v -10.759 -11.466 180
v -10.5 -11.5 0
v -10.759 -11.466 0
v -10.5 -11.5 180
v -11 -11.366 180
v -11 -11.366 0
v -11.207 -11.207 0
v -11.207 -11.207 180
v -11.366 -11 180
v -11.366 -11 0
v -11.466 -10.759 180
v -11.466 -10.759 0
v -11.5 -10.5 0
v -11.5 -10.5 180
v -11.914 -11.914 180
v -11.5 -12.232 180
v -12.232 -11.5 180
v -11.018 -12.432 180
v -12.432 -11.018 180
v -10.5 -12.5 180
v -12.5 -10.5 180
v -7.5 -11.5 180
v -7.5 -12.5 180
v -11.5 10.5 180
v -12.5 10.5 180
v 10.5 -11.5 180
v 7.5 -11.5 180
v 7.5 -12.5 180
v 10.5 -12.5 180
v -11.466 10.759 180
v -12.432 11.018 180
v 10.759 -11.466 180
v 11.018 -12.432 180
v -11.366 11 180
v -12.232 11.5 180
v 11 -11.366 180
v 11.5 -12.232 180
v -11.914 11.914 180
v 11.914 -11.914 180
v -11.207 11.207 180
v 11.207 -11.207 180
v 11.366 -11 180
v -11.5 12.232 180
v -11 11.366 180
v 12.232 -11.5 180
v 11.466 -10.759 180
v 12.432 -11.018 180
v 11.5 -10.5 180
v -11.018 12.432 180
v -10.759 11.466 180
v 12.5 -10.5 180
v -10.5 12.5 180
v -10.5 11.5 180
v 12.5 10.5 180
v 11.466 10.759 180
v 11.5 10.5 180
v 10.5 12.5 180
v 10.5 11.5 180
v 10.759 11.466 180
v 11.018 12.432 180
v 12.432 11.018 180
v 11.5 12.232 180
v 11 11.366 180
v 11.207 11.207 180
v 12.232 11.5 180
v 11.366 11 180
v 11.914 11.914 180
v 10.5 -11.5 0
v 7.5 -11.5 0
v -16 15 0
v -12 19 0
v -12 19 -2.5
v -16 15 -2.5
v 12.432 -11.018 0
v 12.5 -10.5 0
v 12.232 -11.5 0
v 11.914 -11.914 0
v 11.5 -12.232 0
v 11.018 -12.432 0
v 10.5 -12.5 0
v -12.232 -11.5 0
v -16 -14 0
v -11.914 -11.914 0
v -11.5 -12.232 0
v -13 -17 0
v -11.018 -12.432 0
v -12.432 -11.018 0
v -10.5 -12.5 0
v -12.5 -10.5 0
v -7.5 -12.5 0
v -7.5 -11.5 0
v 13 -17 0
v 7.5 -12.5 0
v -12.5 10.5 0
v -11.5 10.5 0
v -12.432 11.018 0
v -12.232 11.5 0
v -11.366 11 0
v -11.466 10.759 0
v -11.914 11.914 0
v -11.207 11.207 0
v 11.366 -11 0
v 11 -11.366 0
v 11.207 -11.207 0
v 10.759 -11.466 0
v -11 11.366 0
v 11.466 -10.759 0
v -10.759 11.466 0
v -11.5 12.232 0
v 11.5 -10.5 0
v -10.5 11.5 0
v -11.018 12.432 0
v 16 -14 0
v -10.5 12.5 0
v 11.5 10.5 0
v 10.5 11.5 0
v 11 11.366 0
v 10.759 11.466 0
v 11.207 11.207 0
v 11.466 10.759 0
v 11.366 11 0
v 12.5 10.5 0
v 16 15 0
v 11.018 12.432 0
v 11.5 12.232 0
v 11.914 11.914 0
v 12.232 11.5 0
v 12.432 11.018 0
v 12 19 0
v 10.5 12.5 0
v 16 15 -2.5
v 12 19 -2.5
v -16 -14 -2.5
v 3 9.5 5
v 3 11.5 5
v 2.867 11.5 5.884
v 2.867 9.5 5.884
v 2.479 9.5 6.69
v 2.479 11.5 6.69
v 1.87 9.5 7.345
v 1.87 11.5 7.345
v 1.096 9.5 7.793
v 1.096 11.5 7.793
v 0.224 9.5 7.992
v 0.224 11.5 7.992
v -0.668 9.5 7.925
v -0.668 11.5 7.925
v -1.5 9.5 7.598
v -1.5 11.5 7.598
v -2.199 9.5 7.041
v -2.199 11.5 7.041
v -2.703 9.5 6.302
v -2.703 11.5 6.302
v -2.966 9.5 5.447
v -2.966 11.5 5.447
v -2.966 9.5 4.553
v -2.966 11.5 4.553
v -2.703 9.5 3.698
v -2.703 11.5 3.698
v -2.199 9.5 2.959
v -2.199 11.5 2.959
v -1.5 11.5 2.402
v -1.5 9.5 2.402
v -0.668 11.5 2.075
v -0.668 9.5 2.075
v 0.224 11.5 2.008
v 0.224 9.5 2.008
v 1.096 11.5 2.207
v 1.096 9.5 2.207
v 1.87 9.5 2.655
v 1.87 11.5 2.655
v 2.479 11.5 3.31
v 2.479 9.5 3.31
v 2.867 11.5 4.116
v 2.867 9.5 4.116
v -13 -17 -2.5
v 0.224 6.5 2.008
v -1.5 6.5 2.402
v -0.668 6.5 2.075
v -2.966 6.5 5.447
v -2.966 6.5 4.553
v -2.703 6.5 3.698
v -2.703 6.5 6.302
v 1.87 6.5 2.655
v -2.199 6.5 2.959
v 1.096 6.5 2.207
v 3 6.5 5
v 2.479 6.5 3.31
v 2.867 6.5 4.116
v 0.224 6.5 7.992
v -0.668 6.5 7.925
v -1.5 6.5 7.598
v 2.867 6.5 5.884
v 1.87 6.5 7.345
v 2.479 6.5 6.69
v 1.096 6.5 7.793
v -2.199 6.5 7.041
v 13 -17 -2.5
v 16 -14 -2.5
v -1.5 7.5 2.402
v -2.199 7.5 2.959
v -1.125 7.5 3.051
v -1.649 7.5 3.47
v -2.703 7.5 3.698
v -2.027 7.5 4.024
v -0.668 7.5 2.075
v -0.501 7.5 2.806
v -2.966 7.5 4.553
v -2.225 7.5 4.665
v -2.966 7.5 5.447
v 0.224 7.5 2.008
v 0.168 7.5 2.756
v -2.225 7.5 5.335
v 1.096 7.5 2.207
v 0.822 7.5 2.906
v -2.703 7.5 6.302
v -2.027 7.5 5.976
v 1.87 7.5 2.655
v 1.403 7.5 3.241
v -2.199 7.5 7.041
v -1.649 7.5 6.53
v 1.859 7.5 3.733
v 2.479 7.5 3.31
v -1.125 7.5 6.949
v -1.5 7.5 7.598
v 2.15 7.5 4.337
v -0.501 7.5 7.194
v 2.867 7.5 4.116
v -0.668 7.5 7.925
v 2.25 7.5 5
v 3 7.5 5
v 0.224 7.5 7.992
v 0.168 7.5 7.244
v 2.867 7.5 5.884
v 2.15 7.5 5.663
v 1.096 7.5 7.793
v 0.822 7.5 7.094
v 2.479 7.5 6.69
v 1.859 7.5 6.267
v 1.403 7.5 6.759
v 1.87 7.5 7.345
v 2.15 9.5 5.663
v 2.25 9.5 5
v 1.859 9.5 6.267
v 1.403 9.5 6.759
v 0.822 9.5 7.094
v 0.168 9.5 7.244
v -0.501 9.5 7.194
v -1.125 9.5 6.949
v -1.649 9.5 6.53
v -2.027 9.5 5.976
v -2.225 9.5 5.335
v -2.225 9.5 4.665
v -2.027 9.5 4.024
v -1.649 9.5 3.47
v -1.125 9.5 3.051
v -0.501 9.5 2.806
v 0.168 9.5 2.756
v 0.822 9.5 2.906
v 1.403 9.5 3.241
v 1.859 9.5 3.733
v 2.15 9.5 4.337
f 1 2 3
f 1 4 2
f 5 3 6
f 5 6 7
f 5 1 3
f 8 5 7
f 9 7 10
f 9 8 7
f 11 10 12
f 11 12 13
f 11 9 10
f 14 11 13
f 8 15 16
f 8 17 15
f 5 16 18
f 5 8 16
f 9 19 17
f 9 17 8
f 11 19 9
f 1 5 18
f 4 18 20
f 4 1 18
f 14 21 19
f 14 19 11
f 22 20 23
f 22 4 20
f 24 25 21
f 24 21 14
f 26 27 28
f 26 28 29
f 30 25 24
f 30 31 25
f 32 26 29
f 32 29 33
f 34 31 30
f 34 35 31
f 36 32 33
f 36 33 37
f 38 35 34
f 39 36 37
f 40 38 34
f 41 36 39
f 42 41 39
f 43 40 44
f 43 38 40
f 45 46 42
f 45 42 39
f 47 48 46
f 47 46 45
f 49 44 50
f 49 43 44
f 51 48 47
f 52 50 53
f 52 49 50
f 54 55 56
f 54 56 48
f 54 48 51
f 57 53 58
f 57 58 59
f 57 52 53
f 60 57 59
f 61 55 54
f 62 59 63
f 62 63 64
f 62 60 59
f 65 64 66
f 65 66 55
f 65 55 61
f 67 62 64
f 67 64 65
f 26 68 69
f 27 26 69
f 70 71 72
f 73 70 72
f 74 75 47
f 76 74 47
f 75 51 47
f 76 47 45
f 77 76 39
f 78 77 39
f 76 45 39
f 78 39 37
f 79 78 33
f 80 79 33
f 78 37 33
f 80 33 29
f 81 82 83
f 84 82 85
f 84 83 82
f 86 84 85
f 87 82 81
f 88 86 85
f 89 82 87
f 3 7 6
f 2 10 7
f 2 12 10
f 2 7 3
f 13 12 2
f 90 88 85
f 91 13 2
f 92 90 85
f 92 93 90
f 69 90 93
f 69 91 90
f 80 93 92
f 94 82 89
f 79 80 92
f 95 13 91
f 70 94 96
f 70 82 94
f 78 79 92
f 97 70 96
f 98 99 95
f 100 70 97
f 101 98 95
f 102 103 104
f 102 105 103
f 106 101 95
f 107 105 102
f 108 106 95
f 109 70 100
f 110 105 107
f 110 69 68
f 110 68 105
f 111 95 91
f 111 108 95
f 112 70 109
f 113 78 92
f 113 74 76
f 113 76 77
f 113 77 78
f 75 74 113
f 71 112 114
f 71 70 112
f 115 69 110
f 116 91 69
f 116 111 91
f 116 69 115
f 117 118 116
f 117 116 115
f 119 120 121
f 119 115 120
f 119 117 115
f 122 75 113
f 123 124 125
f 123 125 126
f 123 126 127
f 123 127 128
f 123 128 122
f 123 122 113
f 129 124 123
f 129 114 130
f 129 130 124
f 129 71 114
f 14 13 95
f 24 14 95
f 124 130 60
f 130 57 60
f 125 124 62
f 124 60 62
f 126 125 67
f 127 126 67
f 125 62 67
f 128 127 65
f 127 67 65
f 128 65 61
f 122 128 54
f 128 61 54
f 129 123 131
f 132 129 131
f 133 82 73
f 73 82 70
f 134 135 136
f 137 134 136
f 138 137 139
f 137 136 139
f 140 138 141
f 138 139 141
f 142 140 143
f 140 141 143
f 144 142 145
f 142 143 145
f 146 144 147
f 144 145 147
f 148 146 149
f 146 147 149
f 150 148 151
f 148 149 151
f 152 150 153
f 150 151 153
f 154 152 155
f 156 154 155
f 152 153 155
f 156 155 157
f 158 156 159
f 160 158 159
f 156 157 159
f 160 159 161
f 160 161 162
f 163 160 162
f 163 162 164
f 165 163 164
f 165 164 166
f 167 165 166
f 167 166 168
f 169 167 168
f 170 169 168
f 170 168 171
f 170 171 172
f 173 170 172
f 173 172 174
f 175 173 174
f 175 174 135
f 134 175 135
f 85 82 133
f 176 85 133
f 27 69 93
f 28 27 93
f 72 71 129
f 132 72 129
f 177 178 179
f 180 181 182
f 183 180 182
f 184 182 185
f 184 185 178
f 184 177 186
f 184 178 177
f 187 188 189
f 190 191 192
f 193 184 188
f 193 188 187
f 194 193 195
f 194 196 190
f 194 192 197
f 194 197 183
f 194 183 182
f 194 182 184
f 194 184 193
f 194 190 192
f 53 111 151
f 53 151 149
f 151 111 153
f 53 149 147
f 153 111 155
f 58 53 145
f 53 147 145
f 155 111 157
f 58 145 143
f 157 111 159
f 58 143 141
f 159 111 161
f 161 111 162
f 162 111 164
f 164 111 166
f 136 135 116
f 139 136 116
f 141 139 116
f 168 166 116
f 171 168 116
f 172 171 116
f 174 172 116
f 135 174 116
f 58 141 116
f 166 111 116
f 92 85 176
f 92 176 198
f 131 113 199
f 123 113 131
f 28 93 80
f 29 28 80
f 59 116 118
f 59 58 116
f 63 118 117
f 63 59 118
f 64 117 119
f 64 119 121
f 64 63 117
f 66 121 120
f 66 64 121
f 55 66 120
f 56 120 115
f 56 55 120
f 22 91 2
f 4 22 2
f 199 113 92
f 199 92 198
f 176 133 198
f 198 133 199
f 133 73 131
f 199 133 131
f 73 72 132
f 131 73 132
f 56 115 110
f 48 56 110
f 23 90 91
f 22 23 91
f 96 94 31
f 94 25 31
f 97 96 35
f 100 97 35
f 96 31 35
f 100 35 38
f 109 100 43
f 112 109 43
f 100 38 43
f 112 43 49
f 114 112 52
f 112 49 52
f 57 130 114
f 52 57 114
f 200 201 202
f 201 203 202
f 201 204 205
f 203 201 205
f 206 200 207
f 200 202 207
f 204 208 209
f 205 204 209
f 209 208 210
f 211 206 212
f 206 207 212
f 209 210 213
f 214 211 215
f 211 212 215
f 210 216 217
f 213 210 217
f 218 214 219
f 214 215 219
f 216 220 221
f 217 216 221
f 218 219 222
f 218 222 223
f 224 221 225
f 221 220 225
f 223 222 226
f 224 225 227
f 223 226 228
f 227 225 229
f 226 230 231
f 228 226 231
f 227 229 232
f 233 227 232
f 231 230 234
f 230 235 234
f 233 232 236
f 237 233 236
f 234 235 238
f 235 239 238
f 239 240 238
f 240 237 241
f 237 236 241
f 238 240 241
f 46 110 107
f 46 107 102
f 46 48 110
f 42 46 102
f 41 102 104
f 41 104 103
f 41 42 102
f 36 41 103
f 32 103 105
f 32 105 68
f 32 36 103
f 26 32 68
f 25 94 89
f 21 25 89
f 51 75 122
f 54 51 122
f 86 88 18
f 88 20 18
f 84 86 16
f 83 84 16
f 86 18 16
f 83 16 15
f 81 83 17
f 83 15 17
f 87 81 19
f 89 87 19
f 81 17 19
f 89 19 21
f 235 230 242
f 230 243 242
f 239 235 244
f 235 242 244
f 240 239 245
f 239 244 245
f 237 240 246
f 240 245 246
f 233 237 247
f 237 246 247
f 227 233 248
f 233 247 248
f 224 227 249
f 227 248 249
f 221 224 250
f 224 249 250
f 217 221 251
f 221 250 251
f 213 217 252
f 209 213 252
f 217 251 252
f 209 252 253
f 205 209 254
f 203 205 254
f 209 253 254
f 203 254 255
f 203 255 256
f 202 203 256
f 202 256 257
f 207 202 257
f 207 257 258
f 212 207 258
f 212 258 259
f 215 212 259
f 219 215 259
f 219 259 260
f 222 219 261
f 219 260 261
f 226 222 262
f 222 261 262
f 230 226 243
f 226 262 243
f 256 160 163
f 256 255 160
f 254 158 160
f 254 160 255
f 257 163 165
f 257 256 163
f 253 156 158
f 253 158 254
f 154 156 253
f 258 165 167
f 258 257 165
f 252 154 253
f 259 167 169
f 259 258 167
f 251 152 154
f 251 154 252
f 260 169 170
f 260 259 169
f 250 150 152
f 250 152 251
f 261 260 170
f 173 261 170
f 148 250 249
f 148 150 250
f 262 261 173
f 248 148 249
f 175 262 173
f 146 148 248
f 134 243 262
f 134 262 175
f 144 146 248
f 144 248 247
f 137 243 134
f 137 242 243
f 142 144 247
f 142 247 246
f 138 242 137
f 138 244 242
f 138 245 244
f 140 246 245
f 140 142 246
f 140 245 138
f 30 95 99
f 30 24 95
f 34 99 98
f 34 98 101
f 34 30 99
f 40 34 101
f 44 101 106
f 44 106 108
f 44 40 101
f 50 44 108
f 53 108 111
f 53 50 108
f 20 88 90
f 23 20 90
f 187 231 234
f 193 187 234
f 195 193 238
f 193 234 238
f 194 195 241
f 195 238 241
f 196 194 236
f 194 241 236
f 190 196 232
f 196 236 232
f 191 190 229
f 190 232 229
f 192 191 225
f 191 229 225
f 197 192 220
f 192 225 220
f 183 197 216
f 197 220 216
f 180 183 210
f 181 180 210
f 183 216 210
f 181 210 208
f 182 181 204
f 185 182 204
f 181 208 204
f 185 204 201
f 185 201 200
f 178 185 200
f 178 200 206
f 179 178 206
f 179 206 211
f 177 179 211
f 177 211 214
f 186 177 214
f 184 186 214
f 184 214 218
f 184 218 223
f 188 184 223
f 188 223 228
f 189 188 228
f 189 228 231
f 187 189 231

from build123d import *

# Parameters (mm, degrees)
F0_W      = 32
F0_H      = 36
F1_DEPTH  = 2.5
F3_DEPTH  = 180
F4_R      = 1
F5_R      = 2
F6_R      = 3
F7_DEPTH  = 5
F9_R      = 3
F9_R_2    = 2.25
F10_DEPTH = 1
F11_SIZE  = 3
F12_SIZE  = 4


with BuildPart() as f1:
    # F0 (on Top) → F1 (new body)
    with BuildSketch(Plane.XY):
        with Locations((0, 1)):
            Rectangle(F0_W, F0_H)
    extrude(amount=-F1_DEPTH)

    # F2 (on face) → F3 (join)
    with BuildSketch(Plane.XY):
        Polygon((12.5, -12.5), (12.5, 12.5), (-12.5, 12.5), (-12.5, -12.5), (-7.5, -12.5), (-7.5, -11.5), (-11.5, -11.5), (-11.5, 11.5), (11.5, 11.5), (11.5, -11.5), (7.5, -11.5), (7.5, -12.5), align=None)
    extrude(amount=F3_DEPTH)

    # F4
    f4_edges = [f1.edges().sort_by_distance(p)[0] for p in [
        (-11.5, 11.5, 90),
        (11.5, 11.5, 90),
        (-11.5, -11.5, 90),
        (11.5, -11.5, 90),
    ]]
    fillet(f4_edges, radius=F4_R)

    # F5
    f5_edges = [f1.edges().sort_by_distance(p)[0] for p in [
        (-12.5, 12.5, 90),
        (12.5, 12.5, 90),
        (12.5, -12.5, 90),
        (-12.5, -12.5, 90),
    ]]
    fillet(f5_edges, radius=F5_R)

    # F6 (on face) → F7 (join)
    with BuildSketch(Plane.XZ.offset(-11.5)):
        with Locations((0, 5)):
            Circle(F6_R)
    extrude(amount=F7_DEPTH)

    # F9 (on offset) → F10 (cut, symmetric)
    with BuildSketch(Plane.XZ.offset(-8.5)):
        with Locations((0, 5)):
            Circle(F9_R)
        with Locations((0, 5)):
            Circle(F9_R_2, mode=Mode.SUBTRACT)
    extrude(amount=F10_DEPTH, both=True, mode=Mode.SUBTRACT)

    # F11
    f11_edges = [f1.edges().sort_by_distance(p)[0] for p in [
        (-16, -17, -1.25),
        (16, -17, -1.25),
    ]]
    chamfer(f11_edges, length=F11_SIZE)

    # F12
    f12_edges = [f1.edges().sort_by_distance(p)[0] for p in [
        (16, 19, -1.25),
        (-16, 19, -1.25),
    ]]
    chamfer(f12_edges, length=F12_SIZE)


solid = f1.part
